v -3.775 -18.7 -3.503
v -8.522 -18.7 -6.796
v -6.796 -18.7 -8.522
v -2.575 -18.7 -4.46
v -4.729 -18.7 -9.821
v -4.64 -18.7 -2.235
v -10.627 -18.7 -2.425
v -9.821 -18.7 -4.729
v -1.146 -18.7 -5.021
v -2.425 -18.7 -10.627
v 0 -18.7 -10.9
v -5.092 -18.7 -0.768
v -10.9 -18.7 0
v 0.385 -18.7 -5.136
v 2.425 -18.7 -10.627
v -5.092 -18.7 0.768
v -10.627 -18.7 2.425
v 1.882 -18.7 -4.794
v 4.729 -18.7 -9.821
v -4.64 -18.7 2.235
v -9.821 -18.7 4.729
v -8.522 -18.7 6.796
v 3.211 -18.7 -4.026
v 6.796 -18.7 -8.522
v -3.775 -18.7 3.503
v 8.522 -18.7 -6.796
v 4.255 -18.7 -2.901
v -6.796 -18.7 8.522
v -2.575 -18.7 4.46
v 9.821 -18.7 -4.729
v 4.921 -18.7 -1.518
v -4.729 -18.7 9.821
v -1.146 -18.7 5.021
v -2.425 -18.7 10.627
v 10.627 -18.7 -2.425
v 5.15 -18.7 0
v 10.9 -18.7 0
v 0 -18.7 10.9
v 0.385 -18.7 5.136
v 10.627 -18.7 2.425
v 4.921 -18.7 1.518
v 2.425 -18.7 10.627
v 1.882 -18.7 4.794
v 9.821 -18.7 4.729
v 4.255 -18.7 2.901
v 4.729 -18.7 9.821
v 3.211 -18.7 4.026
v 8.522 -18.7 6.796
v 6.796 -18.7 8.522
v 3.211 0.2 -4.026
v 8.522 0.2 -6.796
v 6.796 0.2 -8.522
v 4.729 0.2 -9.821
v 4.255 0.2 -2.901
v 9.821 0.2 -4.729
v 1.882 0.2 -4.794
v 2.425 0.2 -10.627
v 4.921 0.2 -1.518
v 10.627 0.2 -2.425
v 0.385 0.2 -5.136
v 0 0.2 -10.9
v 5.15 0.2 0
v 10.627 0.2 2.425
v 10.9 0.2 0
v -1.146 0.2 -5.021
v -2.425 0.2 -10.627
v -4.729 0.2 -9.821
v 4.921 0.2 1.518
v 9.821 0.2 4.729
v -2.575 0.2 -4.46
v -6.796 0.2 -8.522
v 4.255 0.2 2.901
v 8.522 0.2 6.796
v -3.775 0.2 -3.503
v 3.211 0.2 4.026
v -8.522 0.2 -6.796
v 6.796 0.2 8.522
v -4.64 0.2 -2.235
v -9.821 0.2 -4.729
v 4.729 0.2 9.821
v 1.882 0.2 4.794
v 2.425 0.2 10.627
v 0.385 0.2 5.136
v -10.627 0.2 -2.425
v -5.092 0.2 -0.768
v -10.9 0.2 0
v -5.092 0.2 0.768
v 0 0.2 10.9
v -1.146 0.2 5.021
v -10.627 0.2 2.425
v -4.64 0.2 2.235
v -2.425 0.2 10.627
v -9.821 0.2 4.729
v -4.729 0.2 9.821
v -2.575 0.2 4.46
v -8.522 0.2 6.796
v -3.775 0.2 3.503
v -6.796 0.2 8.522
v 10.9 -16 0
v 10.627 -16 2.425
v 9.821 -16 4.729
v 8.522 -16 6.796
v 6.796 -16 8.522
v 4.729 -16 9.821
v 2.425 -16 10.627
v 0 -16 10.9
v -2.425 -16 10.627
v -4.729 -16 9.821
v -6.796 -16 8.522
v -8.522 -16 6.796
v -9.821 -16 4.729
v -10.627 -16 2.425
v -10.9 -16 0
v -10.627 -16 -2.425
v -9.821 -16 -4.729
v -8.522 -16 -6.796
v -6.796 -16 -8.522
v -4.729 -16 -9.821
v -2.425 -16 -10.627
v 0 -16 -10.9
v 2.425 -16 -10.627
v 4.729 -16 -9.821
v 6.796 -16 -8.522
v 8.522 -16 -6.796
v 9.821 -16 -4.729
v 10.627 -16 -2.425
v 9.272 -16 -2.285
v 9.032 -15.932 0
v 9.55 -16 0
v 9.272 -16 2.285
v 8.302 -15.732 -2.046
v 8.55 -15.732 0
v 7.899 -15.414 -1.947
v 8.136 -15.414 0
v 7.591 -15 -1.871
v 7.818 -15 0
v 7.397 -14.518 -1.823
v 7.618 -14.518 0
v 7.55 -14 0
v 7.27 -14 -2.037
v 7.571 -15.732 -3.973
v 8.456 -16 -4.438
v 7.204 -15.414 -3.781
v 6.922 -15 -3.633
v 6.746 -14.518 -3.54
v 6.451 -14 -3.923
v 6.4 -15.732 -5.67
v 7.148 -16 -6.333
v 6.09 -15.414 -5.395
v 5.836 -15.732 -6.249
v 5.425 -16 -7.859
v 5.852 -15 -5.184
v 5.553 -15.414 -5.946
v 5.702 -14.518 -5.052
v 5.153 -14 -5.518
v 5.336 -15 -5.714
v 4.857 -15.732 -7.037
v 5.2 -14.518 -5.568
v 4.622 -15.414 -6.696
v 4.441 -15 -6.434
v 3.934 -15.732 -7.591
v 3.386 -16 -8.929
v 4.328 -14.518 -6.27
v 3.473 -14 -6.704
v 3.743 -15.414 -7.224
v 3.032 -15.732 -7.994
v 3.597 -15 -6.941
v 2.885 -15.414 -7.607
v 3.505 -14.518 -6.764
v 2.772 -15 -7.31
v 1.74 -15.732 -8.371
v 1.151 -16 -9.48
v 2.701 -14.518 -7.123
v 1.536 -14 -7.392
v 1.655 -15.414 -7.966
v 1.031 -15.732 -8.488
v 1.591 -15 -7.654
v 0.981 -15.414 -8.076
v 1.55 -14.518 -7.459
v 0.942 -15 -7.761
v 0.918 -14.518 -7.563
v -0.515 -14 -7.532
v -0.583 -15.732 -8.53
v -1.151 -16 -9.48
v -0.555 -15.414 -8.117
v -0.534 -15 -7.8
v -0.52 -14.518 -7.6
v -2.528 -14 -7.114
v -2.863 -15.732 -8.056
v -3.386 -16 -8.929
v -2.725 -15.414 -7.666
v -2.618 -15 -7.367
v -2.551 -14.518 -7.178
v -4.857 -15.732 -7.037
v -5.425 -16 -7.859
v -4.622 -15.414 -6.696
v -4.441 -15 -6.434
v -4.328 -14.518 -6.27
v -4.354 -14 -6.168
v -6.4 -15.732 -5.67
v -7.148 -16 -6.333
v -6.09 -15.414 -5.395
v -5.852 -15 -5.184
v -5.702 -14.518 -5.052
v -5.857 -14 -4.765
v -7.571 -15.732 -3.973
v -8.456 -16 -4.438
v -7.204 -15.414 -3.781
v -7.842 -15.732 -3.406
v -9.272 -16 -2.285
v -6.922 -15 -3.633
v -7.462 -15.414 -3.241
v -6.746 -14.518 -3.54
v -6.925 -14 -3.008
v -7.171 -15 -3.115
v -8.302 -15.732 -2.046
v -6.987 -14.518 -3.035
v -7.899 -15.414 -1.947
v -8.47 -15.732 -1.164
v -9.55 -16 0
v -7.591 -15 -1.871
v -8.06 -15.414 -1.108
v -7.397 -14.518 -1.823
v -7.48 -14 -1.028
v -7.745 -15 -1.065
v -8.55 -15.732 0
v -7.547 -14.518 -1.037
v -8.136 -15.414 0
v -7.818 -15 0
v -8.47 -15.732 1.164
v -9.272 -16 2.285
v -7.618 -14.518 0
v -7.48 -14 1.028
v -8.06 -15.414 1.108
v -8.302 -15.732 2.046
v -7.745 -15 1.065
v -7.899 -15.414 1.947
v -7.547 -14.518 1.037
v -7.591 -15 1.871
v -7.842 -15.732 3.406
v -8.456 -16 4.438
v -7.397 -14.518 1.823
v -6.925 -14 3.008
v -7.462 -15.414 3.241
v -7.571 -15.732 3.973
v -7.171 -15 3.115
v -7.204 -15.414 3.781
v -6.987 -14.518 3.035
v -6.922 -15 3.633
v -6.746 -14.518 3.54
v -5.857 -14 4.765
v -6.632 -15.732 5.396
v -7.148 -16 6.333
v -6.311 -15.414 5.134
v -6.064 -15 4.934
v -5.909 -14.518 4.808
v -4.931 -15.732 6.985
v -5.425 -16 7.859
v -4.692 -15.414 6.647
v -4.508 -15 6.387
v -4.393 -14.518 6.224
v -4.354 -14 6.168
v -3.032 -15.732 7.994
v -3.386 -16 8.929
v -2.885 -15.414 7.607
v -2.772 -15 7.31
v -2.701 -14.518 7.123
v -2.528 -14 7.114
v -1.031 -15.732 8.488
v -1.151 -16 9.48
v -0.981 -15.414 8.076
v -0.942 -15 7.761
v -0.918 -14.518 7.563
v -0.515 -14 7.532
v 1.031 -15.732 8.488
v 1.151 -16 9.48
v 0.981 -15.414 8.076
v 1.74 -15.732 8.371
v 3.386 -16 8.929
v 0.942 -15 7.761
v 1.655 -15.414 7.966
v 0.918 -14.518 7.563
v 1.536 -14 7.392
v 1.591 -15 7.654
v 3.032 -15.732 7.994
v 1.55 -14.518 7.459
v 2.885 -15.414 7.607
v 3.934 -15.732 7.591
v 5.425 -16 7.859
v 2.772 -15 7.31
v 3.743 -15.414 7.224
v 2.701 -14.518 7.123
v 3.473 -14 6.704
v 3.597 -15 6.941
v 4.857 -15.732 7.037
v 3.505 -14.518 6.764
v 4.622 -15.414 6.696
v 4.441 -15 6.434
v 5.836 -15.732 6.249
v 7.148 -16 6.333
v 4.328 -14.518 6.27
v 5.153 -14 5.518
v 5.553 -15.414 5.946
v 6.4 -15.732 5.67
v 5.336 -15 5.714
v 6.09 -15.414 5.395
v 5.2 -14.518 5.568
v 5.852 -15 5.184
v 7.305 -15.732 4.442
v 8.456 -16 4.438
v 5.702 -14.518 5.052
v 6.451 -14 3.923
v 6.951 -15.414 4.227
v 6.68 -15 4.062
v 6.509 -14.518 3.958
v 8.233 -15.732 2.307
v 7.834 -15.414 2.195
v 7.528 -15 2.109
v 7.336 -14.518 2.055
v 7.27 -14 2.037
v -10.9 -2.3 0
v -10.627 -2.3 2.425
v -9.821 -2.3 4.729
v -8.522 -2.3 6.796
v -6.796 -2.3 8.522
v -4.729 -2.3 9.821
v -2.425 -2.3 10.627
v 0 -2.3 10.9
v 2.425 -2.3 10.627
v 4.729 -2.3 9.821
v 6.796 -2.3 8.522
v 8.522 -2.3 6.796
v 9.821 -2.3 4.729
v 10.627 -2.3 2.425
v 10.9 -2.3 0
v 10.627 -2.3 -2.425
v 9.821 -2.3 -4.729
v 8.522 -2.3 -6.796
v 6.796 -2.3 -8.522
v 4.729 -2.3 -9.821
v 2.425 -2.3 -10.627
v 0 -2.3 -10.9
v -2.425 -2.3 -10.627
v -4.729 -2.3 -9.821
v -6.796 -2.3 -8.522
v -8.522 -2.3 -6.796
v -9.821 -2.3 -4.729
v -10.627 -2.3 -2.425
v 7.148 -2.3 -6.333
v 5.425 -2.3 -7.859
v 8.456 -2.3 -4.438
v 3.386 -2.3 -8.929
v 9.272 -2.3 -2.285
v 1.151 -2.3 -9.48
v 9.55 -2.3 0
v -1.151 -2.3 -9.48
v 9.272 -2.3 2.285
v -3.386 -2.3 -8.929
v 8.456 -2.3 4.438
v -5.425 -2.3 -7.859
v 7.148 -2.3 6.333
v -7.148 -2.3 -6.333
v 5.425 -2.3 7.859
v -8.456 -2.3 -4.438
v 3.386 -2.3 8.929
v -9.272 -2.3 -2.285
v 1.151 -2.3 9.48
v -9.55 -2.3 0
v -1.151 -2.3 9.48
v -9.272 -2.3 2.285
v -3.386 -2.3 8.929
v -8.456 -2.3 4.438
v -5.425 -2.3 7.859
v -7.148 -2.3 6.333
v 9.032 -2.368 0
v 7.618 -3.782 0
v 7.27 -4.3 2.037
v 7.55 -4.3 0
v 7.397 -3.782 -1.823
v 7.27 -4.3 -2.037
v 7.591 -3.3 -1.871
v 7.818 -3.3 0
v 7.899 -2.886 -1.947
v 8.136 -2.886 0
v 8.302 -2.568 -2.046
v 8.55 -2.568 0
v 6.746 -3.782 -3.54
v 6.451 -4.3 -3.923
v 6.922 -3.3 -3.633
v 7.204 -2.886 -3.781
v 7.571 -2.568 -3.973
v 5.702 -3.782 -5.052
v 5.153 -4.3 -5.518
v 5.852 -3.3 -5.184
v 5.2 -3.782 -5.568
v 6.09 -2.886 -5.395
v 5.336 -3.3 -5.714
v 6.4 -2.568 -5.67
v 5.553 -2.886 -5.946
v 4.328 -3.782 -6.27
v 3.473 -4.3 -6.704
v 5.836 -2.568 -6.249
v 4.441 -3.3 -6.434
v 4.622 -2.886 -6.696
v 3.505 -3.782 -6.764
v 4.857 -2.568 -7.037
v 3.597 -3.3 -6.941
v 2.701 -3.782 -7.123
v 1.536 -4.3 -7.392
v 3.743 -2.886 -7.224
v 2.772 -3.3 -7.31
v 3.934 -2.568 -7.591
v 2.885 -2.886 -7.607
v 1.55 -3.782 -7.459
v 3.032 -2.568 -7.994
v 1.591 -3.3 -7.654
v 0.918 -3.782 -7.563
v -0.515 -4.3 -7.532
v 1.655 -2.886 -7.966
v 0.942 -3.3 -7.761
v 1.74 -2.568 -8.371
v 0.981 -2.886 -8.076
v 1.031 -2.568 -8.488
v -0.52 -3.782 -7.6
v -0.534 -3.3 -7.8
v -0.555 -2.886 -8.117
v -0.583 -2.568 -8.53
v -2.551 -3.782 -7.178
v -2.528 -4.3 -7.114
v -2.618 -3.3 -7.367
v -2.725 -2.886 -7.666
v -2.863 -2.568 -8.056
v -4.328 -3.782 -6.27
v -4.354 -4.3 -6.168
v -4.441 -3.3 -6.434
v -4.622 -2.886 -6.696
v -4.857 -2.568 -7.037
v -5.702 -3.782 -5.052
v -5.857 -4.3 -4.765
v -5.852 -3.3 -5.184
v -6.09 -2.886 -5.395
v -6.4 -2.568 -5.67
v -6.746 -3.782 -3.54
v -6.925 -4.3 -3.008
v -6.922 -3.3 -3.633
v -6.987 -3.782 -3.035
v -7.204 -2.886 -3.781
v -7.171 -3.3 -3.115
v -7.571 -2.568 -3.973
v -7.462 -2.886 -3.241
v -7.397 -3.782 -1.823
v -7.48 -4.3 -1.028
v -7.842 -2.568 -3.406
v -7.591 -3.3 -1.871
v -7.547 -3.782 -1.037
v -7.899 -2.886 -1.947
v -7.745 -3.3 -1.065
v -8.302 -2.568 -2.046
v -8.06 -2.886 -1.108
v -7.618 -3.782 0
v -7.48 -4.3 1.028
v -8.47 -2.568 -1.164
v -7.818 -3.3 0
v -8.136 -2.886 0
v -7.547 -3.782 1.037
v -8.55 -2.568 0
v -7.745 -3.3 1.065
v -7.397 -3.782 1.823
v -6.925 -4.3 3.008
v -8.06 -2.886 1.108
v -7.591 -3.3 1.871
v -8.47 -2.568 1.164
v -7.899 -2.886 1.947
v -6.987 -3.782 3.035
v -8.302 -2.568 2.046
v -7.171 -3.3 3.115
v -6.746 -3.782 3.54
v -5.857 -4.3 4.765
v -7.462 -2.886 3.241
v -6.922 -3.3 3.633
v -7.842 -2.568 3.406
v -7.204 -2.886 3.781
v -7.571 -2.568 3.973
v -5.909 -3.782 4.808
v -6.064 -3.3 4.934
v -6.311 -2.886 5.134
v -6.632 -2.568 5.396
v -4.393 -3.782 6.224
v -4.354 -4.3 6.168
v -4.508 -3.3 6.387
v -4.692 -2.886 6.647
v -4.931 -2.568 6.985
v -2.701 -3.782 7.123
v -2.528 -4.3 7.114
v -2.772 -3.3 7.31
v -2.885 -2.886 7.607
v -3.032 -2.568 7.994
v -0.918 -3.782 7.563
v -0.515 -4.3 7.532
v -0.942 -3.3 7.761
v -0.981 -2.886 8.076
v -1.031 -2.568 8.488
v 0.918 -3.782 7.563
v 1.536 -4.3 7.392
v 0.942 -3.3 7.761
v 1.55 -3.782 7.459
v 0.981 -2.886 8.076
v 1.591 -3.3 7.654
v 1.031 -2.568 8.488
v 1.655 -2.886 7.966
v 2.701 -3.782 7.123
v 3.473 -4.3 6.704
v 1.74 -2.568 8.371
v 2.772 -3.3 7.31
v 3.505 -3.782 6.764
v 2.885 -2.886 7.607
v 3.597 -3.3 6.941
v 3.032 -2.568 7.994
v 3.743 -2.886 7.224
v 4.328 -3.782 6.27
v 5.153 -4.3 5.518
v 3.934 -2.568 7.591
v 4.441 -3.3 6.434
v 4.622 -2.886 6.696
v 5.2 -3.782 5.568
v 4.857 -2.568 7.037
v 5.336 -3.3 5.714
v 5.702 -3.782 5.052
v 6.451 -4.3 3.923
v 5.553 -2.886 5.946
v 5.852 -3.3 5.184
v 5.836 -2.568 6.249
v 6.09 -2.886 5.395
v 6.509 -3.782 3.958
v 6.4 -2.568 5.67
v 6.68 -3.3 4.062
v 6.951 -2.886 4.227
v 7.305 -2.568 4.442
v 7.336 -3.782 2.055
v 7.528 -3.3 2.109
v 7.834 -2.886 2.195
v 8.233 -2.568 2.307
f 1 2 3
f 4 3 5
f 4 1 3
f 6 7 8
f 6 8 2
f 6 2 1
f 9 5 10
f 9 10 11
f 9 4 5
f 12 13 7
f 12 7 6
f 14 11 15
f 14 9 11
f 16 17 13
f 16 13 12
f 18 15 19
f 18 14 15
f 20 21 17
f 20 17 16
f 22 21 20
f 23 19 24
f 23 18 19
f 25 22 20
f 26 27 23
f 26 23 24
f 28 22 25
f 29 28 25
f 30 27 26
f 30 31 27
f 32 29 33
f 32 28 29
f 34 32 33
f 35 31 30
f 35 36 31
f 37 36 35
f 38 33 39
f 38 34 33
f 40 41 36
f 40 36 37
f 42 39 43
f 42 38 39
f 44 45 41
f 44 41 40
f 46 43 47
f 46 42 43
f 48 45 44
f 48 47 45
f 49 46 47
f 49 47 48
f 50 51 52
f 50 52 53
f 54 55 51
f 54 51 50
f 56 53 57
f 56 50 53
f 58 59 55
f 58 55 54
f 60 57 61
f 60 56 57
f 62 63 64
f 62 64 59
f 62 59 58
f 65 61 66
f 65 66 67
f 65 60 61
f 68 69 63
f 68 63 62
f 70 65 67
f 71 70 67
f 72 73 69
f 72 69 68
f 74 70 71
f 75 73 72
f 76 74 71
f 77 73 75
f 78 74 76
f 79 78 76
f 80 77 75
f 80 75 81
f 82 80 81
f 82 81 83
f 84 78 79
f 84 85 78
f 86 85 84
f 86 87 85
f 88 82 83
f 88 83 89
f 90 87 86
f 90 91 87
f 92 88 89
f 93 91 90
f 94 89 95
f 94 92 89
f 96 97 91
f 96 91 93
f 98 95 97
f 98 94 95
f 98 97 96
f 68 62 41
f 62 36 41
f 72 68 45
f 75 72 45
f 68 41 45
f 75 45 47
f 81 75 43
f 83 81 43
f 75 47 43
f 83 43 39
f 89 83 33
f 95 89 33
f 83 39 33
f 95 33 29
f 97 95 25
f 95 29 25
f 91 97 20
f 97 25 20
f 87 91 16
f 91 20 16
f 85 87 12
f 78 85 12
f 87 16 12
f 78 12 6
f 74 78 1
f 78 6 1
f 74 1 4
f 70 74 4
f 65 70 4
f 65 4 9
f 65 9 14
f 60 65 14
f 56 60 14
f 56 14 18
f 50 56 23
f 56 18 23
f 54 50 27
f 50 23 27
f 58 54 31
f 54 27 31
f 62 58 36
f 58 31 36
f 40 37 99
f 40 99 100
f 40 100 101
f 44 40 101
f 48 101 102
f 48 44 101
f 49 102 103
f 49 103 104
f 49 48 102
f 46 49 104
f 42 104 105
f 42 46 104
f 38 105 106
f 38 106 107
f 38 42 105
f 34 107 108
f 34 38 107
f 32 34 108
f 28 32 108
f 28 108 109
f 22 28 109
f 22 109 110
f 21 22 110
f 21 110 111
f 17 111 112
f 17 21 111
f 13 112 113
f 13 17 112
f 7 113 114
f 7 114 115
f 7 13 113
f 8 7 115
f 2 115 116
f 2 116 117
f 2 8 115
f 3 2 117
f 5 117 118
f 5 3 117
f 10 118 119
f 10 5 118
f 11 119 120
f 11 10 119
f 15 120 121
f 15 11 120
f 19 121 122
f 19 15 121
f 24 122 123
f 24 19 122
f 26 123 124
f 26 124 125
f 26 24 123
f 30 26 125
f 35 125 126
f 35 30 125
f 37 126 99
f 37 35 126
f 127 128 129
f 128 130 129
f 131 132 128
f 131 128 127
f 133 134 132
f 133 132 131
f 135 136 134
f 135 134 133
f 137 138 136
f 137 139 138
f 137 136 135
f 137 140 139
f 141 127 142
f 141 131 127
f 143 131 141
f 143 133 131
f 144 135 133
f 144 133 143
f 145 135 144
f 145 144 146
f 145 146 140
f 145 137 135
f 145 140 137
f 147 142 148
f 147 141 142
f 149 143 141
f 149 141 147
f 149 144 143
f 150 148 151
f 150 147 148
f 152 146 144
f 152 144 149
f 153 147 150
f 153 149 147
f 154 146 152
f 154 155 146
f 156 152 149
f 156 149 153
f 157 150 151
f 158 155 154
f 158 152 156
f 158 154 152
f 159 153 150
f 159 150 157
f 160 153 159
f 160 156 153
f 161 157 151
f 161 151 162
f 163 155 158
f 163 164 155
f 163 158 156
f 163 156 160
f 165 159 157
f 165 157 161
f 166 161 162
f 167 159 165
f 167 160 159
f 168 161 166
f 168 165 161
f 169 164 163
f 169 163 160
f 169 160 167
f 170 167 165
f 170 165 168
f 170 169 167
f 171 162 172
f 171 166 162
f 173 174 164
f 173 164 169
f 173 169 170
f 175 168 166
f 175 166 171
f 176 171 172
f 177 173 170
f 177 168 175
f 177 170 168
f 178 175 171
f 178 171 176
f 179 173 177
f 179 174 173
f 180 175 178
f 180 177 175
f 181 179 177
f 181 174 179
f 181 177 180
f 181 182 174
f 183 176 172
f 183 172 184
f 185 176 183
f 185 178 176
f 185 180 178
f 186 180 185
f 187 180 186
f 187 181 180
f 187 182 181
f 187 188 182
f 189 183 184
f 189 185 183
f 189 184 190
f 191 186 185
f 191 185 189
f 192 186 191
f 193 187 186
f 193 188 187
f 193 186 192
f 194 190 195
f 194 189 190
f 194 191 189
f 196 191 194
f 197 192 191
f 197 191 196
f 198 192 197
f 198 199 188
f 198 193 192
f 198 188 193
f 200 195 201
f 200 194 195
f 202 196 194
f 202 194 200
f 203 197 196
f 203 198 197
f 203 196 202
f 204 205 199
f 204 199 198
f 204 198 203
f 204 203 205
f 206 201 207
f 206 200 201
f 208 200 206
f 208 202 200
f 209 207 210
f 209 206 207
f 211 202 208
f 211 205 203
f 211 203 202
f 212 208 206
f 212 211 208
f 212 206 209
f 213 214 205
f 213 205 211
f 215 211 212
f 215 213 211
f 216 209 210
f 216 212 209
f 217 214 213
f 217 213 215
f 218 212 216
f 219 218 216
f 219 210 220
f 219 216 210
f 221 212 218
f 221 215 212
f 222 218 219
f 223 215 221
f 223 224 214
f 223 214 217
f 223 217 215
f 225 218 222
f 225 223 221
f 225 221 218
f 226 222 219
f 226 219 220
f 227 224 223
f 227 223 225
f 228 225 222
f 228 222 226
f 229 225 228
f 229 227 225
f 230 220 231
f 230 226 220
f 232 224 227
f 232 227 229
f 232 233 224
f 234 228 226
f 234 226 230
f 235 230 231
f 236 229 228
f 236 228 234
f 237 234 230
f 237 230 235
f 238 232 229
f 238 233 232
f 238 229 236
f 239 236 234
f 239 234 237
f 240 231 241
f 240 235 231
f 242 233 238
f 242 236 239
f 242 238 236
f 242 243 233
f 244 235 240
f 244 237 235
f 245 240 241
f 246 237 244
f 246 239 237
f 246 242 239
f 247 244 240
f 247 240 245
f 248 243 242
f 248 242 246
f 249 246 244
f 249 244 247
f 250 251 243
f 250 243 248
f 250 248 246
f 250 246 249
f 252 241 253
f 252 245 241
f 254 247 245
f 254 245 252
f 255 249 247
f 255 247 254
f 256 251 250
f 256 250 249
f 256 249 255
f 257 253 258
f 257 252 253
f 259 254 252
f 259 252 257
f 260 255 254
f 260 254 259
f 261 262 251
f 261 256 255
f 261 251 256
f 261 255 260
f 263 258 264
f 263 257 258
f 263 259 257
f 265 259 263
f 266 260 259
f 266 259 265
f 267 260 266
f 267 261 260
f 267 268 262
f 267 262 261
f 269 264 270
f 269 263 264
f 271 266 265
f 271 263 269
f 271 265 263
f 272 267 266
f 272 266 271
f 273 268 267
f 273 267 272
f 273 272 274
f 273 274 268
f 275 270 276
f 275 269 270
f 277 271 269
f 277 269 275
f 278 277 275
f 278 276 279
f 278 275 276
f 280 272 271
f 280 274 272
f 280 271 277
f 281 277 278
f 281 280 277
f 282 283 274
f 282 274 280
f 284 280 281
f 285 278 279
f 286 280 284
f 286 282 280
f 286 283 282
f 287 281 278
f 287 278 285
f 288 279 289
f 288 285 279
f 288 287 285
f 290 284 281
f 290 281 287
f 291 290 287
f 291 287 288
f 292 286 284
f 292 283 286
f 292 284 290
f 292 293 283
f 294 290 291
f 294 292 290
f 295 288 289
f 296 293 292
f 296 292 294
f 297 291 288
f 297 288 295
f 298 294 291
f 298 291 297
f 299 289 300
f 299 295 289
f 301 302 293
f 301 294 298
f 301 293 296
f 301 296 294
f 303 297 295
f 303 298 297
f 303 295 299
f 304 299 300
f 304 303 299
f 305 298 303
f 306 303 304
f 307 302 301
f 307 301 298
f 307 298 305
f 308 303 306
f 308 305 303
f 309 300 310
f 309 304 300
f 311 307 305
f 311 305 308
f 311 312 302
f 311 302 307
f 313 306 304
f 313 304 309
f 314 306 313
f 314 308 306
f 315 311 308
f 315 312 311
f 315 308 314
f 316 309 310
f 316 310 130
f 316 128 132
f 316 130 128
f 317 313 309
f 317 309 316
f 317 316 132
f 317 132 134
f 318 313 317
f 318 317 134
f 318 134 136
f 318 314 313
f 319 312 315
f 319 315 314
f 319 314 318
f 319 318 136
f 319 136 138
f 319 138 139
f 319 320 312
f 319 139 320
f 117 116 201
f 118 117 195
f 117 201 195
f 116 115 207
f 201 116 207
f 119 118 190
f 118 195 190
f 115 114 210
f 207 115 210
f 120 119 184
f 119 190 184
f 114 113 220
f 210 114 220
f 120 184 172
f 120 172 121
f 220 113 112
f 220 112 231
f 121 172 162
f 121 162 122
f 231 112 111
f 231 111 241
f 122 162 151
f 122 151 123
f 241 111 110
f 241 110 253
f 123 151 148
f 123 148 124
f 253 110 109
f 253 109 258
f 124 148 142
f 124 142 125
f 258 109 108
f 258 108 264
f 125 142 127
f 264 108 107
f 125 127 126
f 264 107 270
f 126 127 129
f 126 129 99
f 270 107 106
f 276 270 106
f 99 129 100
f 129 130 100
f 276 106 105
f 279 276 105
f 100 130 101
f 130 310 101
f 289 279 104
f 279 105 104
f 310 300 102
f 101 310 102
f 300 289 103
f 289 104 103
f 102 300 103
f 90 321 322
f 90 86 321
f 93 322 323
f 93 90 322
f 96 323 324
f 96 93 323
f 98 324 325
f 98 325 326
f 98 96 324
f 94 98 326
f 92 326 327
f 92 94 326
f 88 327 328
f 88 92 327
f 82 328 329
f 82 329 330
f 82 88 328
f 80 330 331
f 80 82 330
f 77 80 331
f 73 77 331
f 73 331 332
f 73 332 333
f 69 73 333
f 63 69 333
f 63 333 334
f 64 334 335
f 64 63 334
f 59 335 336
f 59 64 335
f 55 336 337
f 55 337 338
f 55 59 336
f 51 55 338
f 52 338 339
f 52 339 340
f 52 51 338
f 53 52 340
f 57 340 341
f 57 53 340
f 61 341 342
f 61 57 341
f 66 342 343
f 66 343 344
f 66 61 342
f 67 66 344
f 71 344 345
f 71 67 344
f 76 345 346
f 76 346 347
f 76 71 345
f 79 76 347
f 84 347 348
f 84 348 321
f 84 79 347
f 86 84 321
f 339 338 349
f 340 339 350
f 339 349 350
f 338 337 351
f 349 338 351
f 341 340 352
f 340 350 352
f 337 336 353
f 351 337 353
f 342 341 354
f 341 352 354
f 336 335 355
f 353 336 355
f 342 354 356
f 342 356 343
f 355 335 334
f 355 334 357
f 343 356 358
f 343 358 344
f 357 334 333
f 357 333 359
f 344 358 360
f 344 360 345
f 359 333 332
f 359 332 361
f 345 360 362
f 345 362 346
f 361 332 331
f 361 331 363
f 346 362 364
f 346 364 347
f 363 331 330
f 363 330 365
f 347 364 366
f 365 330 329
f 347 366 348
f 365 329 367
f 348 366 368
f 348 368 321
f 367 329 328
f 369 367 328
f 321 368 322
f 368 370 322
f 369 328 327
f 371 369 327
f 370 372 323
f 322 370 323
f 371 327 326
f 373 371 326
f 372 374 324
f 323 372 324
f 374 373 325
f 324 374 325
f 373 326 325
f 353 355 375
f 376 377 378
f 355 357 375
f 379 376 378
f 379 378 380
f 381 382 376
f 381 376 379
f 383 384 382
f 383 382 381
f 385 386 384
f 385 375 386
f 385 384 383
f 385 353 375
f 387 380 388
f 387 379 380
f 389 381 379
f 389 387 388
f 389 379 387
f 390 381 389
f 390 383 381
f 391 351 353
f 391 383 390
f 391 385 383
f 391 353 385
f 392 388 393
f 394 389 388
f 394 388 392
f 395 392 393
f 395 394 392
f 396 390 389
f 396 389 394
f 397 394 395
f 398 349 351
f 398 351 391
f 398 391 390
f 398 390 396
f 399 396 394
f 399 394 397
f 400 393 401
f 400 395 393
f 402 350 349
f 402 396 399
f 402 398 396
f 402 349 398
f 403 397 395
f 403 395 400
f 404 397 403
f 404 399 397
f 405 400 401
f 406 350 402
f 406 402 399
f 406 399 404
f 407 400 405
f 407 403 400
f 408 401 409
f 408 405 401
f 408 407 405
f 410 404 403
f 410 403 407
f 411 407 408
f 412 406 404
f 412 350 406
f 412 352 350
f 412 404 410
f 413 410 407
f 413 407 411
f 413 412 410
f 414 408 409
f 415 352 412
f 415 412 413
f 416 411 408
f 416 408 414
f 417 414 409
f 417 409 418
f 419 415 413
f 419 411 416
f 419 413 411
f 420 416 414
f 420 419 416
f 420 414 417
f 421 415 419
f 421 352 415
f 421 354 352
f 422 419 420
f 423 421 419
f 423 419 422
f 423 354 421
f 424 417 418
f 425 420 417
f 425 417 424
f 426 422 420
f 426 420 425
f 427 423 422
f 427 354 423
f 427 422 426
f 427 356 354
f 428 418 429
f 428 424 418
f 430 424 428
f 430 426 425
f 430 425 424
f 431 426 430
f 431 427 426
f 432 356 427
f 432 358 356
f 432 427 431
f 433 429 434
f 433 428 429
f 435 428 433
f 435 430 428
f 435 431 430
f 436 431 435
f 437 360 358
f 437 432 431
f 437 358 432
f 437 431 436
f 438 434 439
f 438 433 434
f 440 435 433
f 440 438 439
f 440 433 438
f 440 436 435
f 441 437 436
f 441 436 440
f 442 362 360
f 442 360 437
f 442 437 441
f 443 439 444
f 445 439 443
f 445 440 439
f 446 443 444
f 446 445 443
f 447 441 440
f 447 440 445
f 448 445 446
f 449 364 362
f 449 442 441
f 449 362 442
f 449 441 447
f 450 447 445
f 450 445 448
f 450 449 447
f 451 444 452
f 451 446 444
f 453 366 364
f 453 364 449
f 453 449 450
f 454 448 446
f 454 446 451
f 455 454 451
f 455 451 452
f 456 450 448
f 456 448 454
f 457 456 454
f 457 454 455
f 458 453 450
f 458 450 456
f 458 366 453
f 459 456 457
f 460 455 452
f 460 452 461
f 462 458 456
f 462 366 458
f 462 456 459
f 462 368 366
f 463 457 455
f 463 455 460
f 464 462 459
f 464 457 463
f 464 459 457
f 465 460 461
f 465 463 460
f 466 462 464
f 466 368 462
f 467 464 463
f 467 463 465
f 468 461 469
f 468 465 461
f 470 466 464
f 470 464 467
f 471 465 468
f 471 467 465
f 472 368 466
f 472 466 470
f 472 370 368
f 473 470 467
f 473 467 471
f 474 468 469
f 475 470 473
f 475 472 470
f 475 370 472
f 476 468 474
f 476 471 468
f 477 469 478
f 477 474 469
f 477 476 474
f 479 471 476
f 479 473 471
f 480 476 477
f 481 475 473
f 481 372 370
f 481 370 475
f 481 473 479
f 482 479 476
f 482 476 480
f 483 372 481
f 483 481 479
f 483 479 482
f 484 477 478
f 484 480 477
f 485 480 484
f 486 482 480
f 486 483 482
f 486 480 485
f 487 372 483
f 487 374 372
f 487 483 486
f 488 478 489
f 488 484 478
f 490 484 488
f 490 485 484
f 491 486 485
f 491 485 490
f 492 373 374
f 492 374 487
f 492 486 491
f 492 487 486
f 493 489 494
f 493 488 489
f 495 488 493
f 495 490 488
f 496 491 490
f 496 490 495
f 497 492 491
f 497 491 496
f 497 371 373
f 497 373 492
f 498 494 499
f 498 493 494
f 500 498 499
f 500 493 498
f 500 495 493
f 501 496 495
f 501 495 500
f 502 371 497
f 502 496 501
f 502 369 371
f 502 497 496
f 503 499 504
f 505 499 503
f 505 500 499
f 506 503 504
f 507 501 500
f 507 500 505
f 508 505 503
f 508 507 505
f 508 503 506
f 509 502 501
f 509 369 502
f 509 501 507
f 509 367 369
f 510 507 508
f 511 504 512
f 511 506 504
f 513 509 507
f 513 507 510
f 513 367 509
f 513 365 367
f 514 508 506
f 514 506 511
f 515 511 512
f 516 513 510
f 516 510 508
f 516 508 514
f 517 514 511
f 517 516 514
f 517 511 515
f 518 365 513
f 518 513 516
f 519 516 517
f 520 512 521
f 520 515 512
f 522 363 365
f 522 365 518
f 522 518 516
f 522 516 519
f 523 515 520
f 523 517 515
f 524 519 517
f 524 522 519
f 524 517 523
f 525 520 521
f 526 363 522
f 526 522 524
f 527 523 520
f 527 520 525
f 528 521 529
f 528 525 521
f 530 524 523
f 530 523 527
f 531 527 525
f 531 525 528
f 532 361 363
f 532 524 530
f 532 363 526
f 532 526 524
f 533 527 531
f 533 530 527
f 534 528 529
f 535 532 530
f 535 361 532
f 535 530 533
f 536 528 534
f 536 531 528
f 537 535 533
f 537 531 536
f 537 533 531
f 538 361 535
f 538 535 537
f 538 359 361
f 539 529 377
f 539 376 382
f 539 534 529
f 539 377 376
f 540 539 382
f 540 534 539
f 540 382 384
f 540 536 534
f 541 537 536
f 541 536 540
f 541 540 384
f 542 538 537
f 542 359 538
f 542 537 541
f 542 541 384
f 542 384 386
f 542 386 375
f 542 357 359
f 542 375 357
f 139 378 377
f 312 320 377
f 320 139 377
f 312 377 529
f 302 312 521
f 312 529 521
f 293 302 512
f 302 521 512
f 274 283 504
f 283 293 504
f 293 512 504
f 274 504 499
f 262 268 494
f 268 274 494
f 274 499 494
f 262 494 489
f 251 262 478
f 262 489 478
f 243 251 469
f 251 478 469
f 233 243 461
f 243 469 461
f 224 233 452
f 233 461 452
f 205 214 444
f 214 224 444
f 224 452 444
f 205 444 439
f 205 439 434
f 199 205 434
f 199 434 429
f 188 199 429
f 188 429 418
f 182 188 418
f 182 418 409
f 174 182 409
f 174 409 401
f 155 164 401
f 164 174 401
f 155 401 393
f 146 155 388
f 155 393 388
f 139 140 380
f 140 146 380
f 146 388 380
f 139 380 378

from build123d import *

# Parameters (mm, degrees)
F0_R     = 7.55
F1_DEPTH = 18.7
F2_R     = 10.9
F3_DEPTH = 2.3
F4_DEPTH = 0.2
F5_R     = 10.9
F6_DEPTH = 2.7
F7_R     = 5.15
F8_DEPTH = 50
F9_R     = 2


with BuildPart() as f1:
    # F0 (on Front) → F1 (new body)
    with BuildSketch(Plane.XZ):
        Circle(F0_R)
    extrude(amount=F1_DEPTH)

    # F2 (on face) → F3 (join)
    with BuildSketch(Plane(origin=(0, 0, 0), x_dir=(-1, 0, 0), z_dir=(0, 1, 0))):
        Circle(F2_R)
    extrude(amount=-F3_DEPTH)

    # F2 (on face) → F4 (join)
    with BuildSketch(Plane(origin=(0, 0, 0), x_dir=(-1, 0, 0), z_dir=(0, 1, 0))):
        Circle(F2_R)
    extrude(amount=F4_DEPTH)

    # F5 (on face) → F6 (join)
    with BuildSketch(Plane.XZ.offset(18.7)):
        Circle(F5_R)
    extrude(amount=-F6_DEPTH)

    # F7 (on Front) → F8 (cut, symmetric)
    with BuildSketch(Plane.XZ):
        Circle(F7_R)
    extrude(amount=F8_DEPTH, both=True, mode=Mode.SUBTRACT)

    # F9
    f9_edges = [f1.edges().sort_by_distance(p)[0] for p in [
        (-7.55, -2.3, 0),
        (-7.55, -16, 0),
    ]]
    fillet(f9_edges, radius=F9_R)


solid = f1.part
